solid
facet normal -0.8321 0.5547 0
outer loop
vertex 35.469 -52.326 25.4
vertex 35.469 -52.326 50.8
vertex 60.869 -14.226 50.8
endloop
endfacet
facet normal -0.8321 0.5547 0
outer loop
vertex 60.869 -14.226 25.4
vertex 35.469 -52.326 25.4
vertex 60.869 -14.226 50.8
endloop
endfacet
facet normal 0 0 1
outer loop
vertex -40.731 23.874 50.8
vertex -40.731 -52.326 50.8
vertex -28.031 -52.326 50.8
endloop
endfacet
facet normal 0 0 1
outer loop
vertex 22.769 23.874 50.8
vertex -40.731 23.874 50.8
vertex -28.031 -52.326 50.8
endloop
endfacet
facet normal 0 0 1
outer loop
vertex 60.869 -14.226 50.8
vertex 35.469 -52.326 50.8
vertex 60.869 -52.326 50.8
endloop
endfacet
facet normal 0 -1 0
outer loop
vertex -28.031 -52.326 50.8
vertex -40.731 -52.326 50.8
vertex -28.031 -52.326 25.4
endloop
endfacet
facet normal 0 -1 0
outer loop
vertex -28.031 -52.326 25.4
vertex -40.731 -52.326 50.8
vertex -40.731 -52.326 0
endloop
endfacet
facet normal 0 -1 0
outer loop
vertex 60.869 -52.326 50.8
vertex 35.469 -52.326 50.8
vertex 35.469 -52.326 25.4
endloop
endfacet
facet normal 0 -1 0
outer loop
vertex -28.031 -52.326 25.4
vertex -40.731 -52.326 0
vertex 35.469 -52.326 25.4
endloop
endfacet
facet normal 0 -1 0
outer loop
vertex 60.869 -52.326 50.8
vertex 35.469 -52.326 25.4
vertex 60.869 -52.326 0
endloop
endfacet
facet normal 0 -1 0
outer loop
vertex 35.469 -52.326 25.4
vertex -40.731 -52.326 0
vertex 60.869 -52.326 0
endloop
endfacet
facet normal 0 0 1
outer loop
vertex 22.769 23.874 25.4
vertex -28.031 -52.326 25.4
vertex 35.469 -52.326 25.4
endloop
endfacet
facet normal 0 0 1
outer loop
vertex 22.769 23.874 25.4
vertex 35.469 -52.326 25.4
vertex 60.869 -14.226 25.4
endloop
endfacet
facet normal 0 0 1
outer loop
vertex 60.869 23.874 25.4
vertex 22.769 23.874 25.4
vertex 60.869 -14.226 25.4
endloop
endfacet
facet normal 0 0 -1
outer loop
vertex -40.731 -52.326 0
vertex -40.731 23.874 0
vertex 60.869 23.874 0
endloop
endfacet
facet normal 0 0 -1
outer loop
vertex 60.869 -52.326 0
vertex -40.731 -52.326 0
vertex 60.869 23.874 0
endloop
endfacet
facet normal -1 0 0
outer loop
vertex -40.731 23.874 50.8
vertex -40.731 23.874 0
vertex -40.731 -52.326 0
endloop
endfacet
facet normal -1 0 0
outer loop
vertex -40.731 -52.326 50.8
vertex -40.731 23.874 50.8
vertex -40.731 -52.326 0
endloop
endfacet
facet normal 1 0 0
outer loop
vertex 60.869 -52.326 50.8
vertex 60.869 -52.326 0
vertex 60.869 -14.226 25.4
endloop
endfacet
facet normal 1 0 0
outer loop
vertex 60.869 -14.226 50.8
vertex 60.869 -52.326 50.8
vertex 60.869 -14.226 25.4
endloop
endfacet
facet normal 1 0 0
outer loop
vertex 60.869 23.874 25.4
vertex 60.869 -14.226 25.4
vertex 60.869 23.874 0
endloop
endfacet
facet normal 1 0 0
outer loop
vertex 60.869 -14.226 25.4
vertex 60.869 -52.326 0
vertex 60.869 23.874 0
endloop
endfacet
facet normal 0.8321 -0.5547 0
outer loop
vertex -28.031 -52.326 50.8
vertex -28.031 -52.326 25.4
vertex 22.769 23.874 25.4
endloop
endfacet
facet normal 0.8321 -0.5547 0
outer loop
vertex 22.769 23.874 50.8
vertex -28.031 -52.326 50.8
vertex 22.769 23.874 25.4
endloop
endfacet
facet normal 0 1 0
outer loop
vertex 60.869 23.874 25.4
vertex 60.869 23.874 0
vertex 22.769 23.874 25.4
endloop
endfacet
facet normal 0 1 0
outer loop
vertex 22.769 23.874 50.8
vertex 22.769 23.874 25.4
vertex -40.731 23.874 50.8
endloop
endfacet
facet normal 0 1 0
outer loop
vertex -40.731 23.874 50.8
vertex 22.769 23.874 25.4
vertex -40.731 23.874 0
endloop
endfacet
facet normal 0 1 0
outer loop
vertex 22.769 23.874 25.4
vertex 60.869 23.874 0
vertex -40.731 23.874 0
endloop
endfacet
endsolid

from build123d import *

# Parameters (mm, degrees)
F0_W     = 101.6
F0_H     = 76.2
F1_DEPTH = 50.8
F3_DEPTH = 25.4
F5_DEPTH = 25.4


with BuildPart() as f1:
    # F0 (on Top) → F1 (new body)
    with BuildSketch(Plane.XY):
        with Locations((10.068508, -14.225589)):
            Rectangle(F0_W, F0_H)
    extrude(amount=F1_DEPTH)

    # F2 (on face) → F3 (cut)
    with BuildSketch(Plane.XY.offset(50.8)):
        Polygon((-40.731492, -52.325589), (35.468508, -52.325589), (60.868508, -14.225589), (60.868508, 23.874411), (-40.731492, 23.874411), align=None)
    extrude(amount=-F3_DEPTH, mode=Mode.SUBTRACT)

    # F4 (on face) → F5 (join)
    with BuildSketch(Plane.XY.offset(25.4)):
        Polygon((-40.731492, 23.874411), (-40.731492, -52.325589), (-28.031492, -52.325589), (22.768508, 23.874411), align=None)
    extrude(amount=F5_DEPTH)


solid = f1.part
